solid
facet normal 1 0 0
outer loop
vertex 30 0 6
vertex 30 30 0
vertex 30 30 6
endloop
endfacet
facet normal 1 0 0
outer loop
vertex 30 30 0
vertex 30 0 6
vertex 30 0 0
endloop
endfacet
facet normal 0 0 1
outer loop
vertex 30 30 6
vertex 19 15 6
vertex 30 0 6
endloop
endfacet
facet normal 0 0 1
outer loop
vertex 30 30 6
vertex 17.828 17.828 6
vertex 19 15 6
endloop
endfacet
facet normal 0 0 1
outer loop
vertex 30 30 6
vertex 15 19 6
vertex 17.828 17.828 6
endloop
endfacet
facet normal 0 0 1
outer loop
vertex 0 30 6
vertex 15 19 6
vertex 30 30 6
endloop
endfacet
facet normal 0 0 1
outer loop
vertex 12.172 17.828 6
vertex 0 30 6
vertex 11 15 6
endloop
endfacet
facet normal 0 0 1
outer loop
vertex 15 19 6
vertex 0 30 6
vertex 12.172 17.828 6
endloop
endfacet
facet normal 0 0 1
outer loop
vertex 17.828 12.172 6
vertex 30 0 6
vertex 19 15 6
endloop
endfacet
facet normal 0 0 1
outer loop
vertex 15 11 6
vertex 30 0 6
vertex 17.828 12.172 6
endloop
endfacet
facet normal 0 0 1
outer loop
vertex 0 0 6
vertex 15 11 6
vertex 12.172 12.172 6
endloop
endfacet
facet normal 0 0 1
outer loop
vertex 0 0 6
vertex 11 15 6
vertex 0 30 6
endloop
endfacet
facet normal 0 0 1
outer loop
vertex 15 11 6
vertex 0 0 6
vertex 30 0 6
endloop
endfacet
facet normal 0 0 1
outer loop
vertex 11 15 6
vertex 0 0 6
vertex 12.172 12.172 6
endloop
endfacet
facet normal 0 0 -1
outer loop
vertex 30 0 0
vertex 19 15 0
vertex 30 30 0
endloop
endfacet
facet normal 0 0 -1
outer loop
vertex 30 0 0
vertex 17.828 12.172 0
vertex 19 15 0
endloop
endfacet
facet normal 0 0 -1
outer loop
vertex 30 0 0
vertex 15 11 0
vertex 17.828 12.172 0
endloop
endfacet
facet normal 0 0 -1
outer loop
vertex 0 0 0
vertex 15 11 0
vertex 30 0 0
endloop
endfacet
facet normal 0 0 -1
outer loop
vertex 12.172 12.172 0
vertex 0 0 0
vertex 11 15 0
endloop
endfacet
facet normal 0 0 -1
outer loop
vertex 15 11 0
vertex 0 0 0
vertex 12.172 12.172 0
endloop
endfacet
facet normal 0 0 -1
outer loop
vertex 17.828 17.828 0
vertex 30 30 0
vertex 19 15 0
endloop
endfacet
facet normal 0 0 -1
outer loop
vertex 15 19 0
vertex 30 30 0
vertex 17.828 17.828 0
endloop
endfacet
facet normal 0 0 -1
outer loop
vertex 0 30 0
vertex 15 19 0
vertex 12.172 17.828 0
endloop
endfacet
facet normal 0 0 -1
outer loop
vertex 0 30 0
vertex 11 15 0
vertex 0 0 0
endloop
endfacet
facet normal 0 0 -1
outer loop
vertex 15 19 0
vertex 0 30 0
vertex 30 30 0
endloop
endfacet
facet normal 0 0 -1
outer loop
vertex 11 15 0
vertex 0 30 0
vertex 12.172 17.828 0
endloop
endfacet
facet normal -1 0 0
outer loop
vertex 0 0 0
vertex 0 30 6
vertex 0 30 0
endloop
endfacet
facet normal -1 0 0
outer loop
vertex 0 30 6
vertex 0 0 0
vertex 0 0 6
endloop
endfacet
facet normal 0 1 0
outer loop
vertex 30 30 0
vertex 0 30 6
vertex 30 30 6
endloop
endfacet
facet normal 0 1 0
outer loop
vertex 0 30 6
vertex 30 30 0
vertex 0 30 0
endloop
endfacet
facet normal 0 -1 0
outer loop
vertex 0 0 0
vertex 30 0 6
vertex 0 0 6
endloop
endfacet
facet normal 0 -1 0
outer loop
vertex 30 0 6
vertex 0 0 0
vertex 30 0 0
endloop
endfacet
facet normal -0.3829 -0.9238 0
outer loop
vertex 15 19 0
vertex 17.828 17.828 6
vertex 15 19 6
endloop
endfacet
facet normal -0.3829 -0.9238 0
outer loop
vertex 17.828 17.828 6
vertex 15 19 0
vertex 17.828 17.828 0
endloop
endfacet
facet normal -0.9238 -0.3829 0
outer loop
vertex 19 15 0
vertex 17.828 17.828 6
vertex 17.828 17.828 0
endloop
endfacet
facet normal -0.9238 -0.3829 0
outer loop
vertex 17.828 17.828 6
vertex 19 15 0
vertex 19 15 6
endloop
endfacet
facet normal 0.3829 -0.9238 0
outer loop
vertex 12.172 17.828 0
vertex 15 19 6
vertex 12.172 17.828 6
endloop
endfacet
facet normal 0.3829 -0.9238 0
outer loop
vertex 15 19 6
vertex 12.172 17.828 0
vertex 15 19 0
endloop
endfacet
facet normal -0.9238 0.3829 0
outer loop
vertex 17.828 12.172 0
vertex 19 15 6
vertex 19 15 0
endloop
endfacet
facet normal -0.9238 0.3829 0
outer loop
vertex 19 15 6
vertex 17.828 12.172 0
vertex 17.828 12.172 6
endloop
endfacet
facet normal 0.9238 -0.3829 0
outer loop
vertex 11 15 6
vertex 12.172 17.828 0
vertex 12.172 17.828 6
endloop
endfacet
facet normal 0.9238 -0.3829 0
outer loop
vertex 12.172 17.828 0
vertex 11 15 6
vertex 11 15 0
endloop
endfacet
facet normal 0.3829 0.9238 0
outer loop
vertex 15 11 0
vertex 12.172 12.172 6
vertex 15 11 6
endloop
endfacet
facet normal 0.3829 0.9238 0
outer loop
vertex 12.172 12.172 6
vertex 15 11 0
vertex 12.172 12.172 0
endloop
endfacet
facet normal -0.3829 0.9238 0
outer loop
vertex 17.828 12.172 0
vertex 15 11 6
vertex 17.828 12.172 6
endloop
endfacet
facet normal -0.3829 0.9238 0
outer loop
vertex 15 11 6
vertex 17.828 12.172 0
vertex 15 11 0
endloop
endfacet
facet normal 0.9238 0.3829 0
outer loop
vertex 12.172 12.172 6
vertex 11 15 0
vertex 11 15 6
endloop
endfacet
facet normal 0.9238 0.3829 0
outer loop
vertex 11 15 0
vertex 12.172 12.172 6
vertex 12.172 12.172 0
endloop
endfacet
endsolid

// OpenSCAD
// Proves check_features.py catches the inscribed-polygon failure it exists for:
// a hole that is correct across CORNERS but undersized ACROSS FLATS, because
// OpenSCAD built the circle as a coarse polygon with its vertices on the ideal
// circle. A bounding-box check cannot see this, and a render looks fine.
//
// Declared target is Ø8. At $fn=8 the across-flats size is 8*cos(180/8) =
// 7.39mm -- 0.61mm under target, well past the 0.05mm default tolerance.

$fn = 8;

// EXPECTED_BBOX: [30, 30, 6]
// EXPECTED_HOLE: [15, 15, 0, "Z", 8.0]

difference() {
    translate([0, 0, 0]) cube([30, 30, 6]);
    translate([15, 15, -1]) cylinder(d = 8, h = 8);
}
